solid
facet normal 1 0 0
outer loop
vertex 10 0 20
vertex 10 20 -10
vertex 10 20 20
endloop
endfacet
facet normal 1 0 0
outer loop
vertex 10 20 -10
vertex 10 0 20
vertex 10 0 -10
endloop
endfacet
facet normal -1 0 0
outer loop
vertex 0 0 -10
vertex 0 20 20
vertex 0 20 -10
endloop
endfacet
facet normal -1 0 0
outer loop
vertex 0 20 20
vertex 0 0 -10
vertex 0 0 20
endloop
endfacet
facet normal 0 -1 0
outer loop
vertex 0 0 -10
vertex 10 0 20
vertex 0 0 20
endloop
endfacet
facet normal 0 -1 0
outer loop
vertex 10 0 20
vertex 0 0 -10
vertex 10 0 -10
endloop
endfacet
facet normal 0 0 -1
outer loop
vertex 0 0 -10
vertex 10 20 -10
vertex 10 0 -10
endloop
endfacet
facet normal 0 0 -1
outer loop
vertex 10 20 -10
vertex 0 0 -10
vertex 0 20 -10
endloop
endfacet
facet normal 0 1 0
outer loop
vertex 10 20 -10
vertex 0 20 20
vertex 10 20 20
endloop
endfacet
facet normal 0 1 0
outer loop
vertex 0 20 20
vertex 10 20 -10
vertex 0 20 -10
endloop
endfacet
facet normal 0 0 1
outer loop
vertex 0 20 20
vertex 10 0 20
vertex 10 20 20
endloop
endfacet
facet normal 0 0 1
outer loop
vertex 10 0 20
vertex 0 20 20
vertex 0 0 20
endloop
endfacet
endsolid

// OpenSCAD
rotate([0,90,0])
  translate( [-20,0,0] )
    cube([30,20,10]);
